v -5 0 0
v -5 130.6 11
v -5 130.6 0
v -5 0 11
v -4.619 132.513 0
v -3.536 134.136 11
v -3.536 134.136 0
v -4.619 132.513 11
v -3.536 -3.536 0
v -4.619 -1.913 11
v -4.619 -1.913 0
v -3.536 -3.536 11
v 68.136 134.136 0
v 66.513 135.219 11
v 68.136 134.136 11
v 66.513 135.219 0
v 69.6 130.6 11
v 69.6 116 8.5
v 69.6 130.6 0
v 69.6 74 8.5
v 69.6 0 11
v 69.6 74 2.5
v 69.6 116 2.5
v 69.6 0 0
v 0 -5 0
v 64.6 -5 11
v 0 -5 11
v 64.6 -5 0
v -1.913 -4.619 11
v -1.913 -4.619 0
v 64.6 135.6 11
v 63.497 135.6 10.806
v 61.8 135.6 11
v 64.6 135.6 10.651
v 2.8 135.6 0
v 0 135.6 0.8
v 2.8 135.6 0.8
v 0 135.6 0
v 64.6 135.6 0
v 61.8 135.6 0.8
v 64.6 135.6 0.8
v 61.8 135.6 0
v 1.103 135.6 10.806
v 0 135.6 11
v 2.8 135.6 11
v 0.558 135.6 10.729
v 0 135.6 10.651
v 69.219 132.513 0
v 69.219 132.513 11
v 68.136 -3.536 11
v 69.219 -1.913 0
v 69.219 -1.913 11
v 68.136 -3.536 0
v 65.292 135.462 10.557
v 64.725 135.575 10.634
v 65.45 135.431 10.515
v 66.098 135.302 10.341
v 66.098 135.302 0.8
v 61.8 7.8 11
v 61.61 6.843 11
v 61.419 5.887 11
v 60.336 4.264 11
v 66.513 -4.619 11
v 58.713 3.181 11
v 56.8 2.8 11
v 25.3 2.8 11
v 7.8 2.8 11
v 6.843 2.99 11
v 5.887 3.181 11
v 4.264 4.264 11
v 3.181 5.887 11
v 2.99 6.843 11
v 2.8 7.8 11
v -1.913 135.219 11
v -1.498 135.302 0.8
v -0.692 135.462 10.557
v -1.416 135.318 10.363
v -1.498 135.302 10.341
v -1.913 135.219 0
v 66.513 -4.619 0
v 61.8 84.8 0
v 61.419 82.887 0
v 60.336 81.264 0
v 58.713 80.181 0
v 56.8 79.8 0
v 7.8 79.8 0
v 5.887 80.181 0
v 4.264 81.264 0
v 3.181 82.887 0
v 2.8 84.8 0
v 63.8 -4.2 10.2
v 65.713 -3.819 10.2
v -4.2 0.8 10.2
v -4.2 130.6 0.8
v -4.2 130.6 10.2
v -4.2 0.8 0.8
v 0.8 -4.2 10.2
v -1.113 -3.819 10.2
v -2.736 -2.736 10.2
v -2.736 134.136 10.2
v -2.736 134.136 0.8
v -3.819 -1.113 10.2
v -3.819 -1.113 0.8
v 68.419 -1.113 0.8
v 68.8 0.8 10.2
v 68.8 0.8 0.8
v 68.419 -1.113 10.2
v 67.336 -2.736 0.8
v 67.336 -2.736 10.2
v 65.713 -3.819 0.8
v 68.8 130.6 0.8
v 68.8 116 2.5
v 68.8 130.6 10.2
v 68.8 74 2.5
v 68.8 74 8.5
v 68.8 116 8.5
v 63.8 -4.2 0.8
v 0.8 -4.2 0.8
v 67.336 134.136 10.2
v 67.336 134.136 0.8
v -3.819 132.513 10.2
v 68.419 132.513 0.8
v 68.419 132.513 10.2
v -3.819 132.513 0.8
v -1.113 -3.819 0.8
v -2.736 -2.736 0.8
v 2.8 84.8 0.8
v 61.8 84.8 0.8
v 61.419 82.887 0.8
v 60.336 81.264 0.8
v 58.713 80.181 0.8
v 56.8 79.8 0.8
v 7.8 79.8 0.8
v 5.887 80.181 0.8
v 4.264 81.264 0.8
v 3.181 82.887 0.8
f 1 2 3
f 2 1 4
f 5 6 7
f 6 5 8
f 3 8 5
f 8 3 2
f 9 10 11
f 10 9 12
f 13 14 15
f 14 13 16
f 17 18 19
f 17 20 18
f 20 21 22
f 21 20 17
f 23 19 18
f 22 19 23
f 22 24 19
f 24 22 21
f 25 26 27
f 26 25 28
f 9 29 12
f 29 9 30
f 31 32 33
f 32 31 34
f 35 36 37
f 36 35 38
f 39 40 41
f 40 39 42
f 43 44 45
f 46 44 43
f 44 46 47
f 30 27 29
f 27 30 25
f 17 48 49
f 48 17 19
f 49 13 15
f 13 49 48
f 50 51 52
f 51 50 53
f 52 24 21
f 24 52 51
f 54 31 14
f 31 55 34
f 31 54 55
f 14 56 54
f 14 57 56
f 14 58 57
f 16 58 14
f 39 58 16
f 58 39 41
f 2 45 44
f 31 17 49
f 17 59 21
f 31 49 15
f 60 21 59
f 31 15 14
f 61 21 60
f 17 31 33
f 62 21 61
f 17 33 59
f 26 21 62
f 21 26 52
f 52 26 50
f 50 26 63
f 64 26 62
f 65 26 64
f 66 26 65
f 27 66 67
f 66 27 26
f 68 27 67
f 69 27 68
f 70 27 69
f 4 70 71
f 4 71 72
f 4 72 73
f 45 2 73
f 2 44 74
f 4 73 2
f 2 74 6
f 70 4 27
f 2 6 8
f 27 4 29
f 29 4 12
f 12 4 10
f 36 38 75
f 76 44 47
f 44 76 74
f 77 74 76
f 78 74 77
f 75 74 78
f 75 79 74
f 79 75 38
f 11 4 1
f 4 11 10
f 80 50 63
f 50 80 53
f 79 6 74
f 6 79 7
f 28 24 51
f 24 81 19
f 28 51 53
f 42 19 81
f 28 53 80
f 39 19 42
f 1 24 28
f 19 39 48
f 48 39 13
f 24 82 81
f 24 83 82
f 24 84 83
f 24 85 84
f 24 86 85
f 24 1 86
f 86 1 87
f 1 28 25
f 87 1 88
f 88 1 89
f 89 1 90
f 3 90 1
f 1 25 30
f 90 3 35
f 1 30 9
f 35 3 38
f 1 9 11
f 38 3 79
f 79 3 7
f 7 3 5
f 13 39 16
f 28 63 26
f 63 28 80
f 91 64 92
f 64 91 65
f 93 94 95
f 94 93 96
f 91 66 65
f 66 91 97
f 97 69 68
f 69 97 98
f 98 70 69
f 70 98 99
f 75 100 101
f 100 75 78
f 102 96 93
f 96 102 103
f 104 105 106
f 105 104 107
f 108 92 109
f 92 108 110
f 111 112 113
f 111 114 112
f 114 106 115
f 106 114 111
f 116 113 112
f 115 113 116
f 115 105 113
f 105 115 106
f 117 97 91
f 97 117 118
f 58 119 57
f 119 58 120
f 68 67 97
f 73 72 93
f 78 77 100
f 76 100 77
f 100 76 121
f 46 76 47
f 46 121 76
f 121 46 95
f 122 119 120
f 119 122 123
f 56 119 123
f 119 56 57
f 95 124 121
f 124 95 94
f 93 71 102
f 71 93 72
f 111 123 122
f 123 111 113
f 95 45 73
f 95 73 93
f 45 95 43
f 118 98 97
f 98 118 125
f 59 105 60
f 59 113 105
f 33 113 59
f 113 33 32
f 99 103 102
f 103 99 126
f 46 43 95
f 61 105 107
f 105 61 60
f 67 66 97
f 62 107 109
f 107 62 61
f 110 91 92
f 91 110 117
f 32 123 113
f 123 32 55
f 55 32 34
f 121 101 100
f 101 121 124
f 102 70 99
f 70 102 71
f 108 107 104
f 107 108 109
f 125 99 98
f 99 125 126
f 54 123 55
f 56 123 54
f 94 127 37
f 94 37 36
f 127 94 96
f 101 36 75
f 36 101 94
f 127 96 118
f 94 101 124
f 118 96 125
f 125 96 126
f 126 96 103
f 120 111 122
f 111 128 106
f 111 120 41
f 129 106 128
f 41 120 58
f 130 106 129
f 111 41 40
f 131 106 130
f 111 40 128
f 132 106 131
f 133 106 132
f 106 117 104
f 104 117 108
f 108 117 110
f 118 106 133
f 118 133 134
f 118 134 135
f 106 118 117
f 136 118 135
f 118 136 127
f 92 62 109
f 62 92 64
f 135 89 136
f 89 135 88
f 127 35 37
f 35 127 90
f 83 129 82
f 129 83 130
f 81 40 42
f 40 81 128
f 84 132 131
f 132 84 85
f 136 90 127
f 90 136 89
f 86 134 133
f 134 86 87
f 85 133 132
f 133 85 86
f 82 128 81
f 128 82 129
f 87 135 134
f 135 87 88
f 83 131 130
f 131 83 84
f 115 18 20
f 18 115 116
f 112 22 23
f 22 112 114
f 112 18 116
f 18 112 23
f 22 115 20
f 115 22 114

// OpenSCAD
inner_width = 73;
inner_height = 139;
rad = 5;
thickness = 0.8;
depth = 11;
width = inner_width + (thickness * 2) - (2 * rad);
height = inner_height + (thickness * 2) - (2 * rad);
buttons_hole = 42;
buttons_hole_w = 6;
rant = 7;
over = 70;
buttons_h = 74;

module baseblock(w=55, h=96, r=5, t=9) {
  hull() {
    cylinder(t, r=r);
    translate([w, 0, 0]) {
      translate([0, h, 0]) cylinder(t, r=r);
      cylinder(t, r=r);
      cylinder(t, r=r);
    }
    translate([0, h, 0]) cylinder(t, r=r);
  }
}



module phonecase() {
  rrant = rant * 2;
  hrant = rant;
  difference() {
    baseblock(w=width, h=height, t=depth);
    hull() {
      translate([thickness, thickness, thickness])
        baseblock(w=width - (thickness * 2), h=height - thickness, t=depth - (thickness * 2));
      translate([thickness + rrant, thickness + rrant, thickness])
        baseblock(w=width - ((thickness + rrant) * 2), h=height - (thickness * 2), t=depth);
    }
    translate([thickness + hrant, thickness + rrant + over, -thickness])
        baseblock(w=width - ((thickness + hrant) * 2), h=height - (thickness * 2), t=depth);
    /* #translate([thickness + rant, thickness + rant + over, -1]) */
    /*   baseblock(w=width - ((thickness + rant) * 2), h=height, t=9); */
    translate([width + rad - (thickness * 1.5), buttons_h, (depth - buttons_hole_w) / 2])
      cube([thickness*2, buttons_hole, buttons_hole_w]);
  }

}

bike_pipe_r = 15;
bike_mount_r = 20;

module bikemount(rad = -100) {
    rotate(rad, [1, 0, 0])
      intersection() {
        translate([-bike_mount_r, -bike_mount_r - (bike_mount_r / 2), -thickness / 2])
          cube([bike_mount_r * 2, bike_mount_r * 2, 50 + thickness]);

        difference() {
          cylinder(50, r=bike_mount_r);
          translate([0, bike_pipe_r / 2, -thickness])
            cylinder(50 + (thickness * 2), r=bike_pipe_r);
        }

      }
}

!phonecase();
translate([0, -2*rad, 0])
  intersection() {
    translate([width / 2, 0, -8])
      bikemount();
    translate([0, 0, - 2 * bike_mount_r])
        cube([width, over, bike_mount_r * 2]);
  }
